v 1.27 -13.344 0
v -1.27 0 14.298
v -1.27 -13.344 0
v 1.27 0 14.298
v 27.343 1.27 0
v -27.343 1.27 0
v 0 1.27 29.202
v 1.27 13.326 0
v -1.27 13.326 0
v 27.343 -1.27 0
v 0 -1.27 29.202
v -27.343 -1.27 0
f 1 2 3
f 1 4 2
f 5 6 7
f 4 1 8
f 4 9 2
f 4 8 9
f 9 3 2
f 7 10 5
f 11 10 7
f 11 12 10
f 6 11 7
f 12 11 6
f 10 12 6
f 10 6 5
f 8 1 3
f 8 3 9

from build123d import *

# Parameters (mm, degrees)
F1_DEPTH = 1.27
F3_DEPTH = 1.27


with BuildPart() as f1:
    # F0 (on Front) → F1 (new body, symmetric)
    with BuildSketch(Plane.XZ):
        Polygon((0, 29.201968), (-27.3431, 0), (27.3431, 0), align=None)
    extrude(amount=F1_DEPTH, both=True)


with BuildPart() as f3:
    # F2 (on Right) → F3 (new body, symmetric)
    with BuildSketch(Plane.YZ):
        Polygon((0, 14.298418), (-13.34431, 0), (13.32569, 0), align=None)
    extrude(amount=F3_DEPTH, both=True)


solid = Compound([f1.part, f3.part])
